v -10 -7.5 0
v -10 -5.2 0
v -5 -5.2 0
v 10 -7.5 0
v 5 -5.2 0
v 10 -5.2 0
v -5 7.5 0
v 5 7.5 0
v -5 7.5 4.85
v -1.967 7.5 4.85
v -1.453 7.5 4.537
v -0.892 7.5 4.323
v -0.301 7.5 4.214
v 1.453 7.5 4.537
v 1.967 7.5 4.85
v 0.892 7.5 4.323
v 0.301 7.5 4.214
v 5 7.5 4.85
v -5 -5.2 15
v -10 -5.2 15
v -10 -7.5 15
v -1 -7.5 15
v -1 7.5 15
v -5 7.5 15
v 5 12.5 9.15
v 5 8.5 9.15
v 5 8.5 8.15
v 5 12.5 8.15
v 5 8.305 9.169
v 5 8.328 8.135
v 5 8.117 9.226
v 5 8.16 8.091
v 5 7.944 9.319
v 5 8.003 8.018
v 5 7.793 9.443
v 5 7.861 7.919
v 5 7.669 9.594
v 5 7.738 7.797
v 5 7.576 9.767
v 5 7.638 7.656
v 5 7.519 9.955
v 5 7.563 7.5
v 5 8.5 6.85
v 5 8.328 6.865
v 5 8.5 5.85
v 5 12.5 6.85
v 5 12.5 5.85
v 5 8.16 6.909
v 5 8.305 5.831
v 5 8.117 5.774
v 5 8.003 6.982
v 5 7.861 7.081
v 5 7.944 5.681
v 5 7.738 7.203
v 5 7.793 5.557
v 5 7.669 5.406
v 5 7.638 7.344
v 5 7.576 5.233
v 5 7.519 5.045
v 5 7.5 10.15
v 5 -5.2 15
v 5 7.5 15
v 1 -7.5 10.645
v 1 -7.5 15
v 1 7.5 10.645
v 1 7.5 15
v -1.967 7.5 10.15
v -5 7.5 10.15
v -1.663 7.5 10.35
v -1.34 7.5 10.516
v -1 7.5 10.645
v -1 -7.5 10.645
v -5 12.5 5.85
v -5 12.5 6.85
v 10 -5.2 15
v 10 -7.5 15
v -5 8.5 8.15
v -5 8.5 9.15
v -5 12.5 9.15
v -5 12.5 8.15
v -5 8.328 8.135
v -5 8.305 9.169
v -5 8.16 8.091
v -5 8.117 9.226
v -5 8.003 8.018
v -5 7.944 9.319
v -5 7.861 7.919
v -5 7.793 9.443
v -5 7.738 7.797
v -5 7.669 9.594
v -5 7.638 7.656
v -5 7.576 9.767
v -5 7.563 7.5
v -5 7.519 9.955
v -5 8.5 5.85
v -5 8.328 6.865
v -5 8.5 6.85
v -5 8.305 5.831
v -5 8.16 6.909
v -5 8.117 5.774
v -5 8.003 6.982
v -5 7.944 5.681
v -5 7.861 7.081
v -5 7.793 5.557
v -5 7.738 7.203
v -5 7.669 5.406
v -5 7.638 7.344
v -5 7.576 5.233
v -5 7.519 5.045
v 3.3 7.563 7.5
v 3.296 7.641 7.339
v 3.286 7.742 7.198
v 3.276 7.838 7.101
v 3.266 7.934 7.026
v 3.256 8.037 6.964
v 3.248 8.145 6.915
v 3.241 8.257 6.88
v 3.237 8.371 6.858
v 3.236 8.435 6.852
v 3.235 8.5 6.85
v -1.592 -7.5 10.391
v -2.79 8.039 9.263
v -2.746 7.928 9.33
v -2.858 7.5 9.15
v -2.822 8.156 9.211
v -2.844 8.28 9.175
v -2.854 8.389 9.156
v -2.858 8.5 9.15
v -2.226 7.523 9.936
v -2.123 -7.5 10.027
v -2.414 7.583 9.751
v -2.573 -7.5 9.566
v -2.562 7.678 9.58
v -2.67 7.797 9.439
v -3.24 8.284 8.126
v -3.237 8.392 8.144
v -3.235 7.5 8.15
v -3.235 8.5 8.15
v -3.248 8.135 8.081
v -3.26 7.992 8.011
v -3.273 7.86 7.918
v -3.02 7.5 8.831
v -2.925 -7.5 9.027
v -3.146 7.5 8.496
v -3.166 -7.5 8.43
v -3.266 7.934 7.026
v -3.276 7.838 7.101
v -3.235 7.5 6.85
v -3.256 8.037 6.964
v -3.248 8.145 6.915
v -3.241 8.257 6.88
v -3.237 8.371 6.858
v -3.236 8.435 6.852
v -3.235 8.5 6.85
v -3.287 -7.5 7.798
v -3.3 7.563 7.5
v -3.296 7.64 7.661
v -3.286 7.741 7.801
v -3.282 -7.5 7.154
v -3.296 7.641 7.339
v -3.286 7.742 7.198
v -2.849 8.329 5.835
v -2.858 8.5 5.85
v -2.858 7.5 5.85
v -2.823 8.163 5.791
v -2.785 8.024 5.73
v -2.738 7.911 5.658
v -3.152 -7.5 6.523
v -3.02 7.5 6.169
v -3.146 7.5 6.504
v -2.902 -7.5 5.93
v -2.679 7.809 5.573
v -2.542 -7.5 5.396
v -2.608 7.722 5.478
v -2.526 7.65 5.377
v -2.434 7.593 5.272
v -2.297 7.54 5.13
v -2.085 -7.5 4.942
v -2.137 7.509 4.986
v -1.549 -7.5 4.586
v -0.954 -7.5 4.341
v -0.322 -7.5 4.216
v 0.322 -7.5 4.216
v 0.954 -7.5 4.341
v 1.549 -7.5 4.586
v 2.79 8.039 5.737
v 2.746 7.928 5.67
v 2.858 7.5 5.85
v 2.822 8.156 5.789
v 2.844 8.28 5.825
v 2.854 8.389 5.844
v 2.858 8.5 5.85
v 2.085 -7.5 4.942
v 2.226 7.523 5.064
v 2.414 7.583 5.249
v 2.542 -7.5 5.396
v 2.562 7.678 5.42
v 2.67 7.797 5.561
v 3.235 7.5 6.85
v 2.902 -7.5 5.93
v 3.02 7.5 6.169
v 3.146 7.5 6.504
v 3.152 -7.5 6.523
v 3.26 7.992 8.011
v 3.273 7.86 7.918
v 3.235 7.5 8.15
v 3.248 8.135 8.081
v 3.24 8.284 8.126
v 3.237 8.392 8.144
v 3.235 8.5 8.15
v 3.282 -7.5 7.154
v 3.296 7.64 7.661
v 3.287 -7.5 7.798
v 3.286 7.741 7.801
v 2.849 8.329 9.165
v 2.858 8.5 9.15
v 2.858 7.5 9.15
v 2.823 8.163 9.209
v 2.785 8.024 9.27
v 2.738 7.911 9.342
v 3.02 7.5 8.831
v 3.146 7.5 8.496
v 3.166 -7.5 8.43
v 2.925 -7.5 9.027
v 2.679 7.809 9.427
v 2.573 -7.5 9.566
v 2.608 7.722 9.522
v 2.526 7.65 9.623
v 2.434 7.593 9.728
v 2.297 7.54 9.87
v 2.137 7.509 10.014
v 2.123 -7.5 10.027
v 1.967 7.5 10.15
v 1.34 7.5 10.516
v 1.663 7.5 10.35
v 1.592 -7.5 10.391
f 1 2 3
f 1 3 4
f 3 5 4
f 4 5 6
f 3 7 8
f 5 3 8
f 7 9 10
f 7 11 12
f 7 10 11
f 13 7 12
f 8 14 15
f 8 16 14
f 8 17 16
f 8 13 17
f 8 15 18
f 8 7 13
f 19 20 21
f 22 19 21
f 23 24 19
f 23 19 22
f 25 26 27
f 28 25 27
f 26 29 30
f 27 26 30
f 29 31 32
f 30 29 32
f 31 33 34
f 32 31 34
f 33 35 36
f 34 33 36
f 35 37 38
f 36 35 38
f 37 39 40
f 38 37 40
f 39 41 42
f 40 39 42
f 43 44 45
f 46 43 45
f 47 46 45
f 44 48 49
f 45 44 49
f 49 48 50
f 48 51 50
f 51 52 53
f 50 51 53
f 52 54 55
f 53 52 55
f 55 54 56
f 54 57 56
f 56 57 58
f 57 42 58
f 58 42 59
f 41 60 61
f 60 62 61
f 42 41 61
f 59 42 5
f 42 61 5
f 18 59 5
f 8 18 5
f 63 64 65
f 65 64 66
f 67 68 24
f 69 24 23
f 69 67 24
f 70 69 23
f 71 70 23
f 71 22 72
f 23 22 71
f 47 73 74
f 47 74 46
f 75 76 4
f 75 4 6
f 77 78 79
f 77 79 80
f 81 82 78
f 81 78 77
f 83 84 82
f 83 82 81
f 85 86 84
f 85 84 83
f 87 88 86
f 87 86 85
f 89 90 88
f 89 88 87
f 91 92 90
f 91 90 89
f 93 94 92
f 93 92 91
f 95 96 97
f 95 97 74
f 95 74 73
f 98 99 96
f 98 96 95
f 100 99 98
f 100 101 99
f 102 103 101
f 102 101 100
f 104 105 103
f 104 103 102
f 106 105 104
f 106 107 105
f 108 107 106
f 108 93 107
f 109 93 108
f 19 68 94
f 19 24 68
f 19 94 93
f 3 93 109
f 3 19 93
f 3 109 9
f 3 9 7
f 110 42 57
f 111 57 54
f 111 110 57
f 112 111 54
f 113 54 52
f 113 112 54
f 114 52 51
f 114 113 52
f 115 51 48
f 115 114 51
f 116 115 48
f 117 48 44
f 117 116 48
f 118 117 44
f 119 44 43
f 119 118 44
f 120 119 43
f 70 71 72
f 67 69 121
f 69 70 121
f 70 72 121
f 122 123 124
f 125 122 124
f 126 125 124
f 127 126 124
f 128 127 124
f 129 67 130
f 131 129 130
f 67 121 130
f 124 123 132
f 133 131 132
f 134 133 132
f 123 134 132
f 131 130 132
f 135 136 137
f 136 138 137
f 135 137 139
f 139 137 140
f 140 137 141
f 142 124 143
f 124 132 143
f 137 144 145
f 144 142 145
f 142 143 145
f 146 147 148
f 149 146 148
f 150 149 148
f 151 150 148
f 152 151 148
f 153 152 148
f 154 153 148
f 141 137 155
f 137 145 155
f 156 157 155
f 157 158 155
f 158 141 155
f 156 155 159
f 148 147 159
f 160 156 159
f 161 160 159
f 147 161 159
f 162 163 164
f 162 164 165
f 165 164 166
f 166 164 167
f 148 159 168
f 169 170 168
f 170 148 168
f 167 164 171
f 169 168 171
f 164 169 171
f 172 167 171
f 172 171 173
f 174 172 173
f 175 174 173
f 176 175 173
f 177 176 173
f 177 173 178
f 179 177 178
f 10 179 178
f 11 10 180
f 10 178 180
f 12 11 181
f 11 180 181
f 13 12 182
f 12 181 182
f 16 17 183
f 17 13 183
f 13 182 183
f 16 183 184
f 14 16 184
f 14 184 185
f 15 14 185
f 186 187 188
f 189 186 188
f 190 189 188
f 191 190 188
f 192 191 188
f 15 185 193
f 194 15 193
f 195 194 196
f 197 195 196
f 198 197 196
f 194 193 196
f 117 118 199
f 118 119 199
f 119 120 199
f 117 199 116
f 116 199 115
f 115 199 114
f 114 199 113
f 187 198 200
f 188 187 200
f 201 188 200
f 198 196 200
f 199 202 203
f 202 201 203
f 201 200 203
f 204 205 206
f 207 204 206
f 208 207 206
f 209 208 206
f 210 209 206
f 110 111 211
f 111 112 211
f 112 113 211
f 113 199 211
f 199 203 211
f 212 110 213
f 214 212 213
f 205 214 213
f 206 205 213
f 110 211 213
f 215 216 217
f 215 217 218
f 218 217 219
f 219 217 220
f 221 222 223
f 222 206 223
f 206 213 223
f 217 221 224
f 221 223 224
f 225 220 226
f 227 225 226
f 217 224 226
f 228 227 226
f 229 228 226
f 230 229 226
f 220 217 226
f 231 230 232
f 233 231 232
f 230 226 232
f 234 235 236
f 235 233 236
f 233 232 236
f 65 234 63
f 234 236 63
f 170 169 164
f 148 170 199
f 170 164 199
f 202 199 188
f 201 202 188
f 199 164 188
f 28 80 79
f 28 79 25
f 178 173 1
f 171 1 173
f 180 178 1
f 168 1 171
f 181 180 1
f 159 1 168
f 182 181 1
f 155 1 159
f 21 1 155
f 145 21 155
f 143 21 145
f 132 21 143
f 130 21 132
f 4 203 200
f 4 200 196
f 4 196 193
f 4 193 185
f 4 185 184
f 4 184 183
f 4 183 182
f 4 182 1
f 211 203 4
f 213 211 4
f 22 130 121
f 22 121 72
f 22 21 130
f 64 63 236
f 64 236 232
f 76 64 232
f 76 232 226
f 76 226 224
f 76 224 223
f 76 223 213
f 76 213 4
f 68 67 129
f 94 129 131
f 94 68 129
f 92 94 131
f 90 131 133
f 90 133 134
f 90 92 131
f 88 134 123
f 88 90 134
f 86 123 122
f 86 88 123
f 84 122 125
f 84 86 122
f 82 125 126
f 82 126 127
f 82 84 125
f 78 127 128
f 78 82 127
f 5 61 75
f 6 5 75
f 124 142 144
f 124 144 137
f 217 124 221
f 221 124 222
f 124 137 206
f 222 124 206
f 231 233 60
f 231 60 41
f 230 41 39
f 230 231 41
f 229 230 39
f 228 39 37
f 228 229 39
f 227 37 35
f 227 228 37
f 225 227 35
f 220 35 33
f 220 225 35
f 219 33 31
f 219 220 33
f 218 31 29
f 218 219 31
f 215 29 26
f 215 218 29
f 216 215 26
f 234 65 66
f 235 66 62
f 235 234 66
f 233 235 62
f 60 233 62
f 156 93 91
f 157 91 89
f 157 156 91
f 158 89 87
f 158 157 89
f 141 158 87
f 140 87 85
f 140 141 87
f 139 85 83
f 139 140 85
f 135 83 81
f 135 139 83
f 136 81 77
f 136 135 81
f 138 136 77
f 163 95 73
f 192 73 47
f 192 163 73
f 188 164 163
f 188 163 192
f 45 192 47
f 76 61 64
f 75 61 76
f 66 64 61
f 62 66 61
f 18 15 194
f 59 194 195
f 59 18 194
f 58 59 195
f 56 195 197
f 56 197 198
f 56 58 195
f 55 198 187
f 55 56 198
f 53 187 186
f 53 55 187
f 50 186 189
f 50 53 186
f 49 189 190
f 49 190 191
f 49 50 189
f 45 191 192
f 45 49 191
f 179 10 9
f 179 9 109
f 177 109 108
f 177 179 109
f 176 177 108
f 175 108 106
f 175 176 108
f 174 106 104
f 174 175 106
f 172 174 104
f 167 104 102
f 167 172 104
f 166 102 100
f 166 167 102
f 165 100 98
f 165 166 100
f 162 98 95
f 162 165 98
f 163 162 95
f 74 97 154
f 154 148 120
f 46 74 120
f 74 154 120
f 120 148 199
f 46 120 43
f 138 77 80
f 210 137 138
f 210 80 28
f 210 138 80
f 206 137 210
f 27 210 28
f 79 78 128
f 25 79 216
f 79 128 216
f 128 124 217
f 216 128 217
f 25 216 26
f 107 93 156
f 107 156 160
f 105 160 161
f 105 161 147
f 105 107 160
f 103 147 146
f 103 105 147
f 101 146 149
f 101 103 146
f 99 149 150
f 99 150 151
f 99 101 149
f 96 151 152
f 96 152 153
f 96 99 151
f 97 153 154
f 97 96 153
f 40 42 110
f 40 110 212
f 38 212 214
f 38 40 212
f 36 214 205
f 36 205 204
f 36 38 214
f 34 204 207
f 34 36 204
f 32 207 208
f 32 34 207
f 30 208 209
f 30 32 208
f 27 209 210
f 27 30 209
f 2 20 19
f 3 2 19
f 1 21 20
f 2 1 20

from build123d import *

# Parameters (mm, degrees)
SKETCH1_W           = 10
SKETCH1_H           = 15
BOSS_EXTRUDE1_DEPTH = 15
SKETCH3_W           = 5
SKETCH3_H           = 2.3
BOSS_EXTRUDE2_DEPTH = 15
SKETCH4_R           = 3.3
CUT_EXTRUDE1_DEPTH  = 24.452078799
SKETCH6_W           = 2
SKETCH6_H           = 15
CUT_EXTRUDE2_DEPTH  = 8
SKETCH7_W           = 10
SKETCH7_H           = 1
BOSS_EXTRUDE3_DEPTH = 5
FILLET1_R           = 1


with BuildPart() as part:
    # Sketch1 → Boss-Extrude1 (new body)
    with BuildSketch(Plane.XY):
        Rectangle(SKETCH1_W, SKETCH1_H)
    extrude(amount=BOSS_EXTRUDE1_DEPTH)

    # Sketch3 → Boss-Extrude2 (add)
    with BuildSketch(Plane.XY.offset(15)):
        with Locations((-7.5, -6.35)):
            Rectangle(SKETCH3_W, SKETCH3_H)
        with Locations((7.5, -6.35)):
            Rectangle(SKETCH3_W, SKETCH3_H)
    extrude(amount=-BOSS_EXTRUDE2_DEPTH)

    # Sketch4 → Cut-Extrude1 (cut, through all)
    with BuildSketch(Plane.XZ.offset(7.5)):
        with Locations(Location((0, 7.5, 0), (0, 0, 270))):
            Circle(SKETCH4_R)
    extrude(amount=-CUT_EXTRUDE1_DEPTH, mode=Mode.SUBTRACT)

    # Sketch6 → Cut-Extrude2 (cut)
    with BuildSketch(Plane.XY.offset(15)):
        Rectangle(SKETCH6_W, SKETCH6_H)
    extrude(amount=-CUT_EXTRUDE2_DEPTH, mode=Mode.SUBTRACT)

    # Sketch7 → Boss-Extrude3 (add)
    with BuildSketch(Plane(origin=(0, 7.5, 0), x_dir=(1, 0, 0), z_dir=(0, 1, 0))):
        with Locations((0, -8.65)):
            Rectangle(SKETCH7_W, SKETCH7_H)
        with Locations((0, -6.35)):
            Rectangle(SKETCH7_W, SKETCH7_H)
    extrude(amount=BOSS_EXTRUDE3_DEPTH)

    # Fillet1
    # the kernel refuses this fillet: 1 mm, written as the material it adds along each edge
    with BuildSketch(Plane(origin=(5, 7.5, 5.85), x_dir=(0, 0, -1), z_dir=(-1, 0, 0))) as fillet1_piece_1_section:
        with BuildLine():
            CenterArc((FILLET1_R, -FILLET1_R), FILLET1_R, 90, 90)
            Line((0, -FILLET1_R), (0, 0))
            Line((0, 0), (FILLET1_R, 0))
        make_face()
    fillet1_piece_1 = extrude(amount=4.642116168, mode=Mode.PRIVATE)
    fillet1_piece_1 = fillet1_piece_1 - Plane(origin=(0, 7.716795794, 7.5), x_dir=(0, 0, -1), z_dir=(0, -1, 0)) * Cylinder(3.3, 14, mode=Mode.PRIVATE)
    add(fillet1_piece_1)
    with BuildSketch(Plane(origin=(0.735351604, 7.5, 6.85), x_dir=(0, 0, 1), z_dir=(1, 0, 0))) as fillet1_piece_2_section:
        with BuildLine():
            CenterArc((FILLET1_R, -FILLET1_R), FILLET1_R, 90, 90)
            Line((0, -FILLET1_R), (0, 0))
            Line((0, 0), (FILLET1_R, 0))
        make_face()
    fillet1_piece_2 = extrude(amount=4.264648396, mode=Mode.PRIVATE)
    fillet1_piece_2 = fillet1_piece_2 - Plane(origin=(0, 7.724716743, 7.5), x_dir=(0, 0, -1), z_dir=(0, -1, 0)) * Cylinder(3.3, 13, mode=Mode.PRIVATE)
    add(fillet1_piece_2)
    with BuildSketch(Plane(origin=(-0.357883832, 7.5, 5.85), x_dir=(0, 0, -1), z_dir=(-1, 0, 0))) as fillet1_piece_3_section:
        with BuildLine():
            CenterArc((FILLET1_R, -FILLET1_R), FILLET1_R, 90, 90)
            Line((0, -FILLET1_R), (0, 0))
            Line((0, 0), (FILLET1_R, 0))
        make_face()
    fillet1_piece_3 = extrude(amount=4.642116168, mode=Mode.PRIVATE)
    fillet1_piece_3 = fillet1_piece_3 - Plane(origin=(0, 7.716795859, 7.5), x_dir=(0, 0, -1), z_dir=(0, -1, 0)) * Cylinder(3.3, 14, mode=Mode.PRIVATE)
    add(fillet1_piece_3)
    with BuildSketch(Plane(origin=(-5, 7.5, 6.85), x_dir=(0, 0, 1), z_dir=(1, 0, 0))) as fillet1_piece_4_section:
        with BuildLine():
            CenterArc((FILLET1_R, -FILLET1_R), FILLET1_R, 90, 90)
            Line((0, -FILLET1_R), (0, 0))
            Line((0, 0), (FILLET1_R, 0))
        make_face()
    fillet1_piece_4 = extrude(amount=4.264648396, mode=Mode.PRIVATE)
    fillet1_piece_4 = fillet1_piece_4 - Plane(origin=(0, 7.724717828, 7.5), x_dir=(0, 0, -1), z_dir=(0, -1, 0)) * Cylinder(3.3, 13, mode=Mode.PRIVATE)
    add(fillet1_piece_4)
    with BuildSketch(Plane(origin=(-0.735351604, 7.5, 8.15), x_dir=(0, 0, -1), z_dir=(-1, 0, 0))) as fillet1_piece_5_section:
        with BuildLine():
            CenterArc((FILLET1_R, -FILLET1_R), FILLET1_R, 90, 90)
            Line((0, -FILLET1_R), (0, 0))
            Line((0, 0), (FILLET1_R, 0))
        make_face()
    fillet1_piece_5 = extrude(amount=4.264648396, mode=Mode.PRIVATE)
    fillet1_piece_5 = fillet1_piece_5 - Plane(origin=(0, 7.724716743, 7.5), x_dir=(0, 0, -1), z_dir=(0, -1, 0)) * Cylinder(3.3, 13, mode=Mode.PRIVATE)
    add(fillet1_piece_5)
    with BuildSketch(Plane(origin=(5, 7.5, 8.15), x_dir=(0, 0, -1), z_dir=(-1, 0, 0))) as fillet1_piece_6_section:
        with BuildLine():
            CenterArc((FILLET1_R, -FILLET1_R), FILLET1_R, 90, 90)
            Line((0, -FILLET1_R), (0, 0))
            Line((0, 0), (FILLET1_R, 0))
        make_face()
    fillet1_piece_6 = extrude(amount=4.264648396, mode=Mode.PRIVATE)
    fillet1_piece_6 = fillet1_piece_6 - Plane(origin=(0, 7.724717828, 7.5), x_dir=(0, 0, -1), z_dir=(0, -1, 0)) * Cylinder(3.3, 13, mode=Mode.PRIVATE)
    add(fillet1_piece_6)
    with BuildSketch(Plane(origin=(-5, 7.5, 9.15), x_dir=(0, 0, 1), z_dir=(1, 0, 0))) as fillet1_piece_7_section:
        with BuildLine():
            CenterArc((FILLET1_R, -FILLET1_R), FILLET1_R, 90, 90)
            Line((0, -FILLET1_R), (0, 0))
            Line((0, 0), (FILLET1_R, 0))
        make_face()
    fillet1_piece_7 = extrude(amount=4.642116168, mode=Mode.PRIVATE)
    fillet1_piece_7 = fillet1_piece_7 - Plane(origin=(0, 7.716795794, 7.5), x_dir=(0, 0, -1), z_dir=(0, -1, 0)) * Cylinder(3.3, 14, mode=Mode.PRIVATE)
    add(fillet1_piece_7)
    with BuildSketch(Plane(origin=(0.357883832, 7.5, 9.15), x_dir=(0, 0, 1), z_dir=(1, 0, 0))) as fillet1_piece_8_section:
        with BuildLine():
            CenterArc((FILLET1_R, -FILLET1_R), FILLET1_R, 90, 90)
            Line((0, -FILLET1_R), (0, 0))
            Line((0, 0), (FILLET1_R, 0))
        make_face()
    fillet1_piece_8 = extrude(amount=4.642116168, mode=Mode.PRIVATE)
    fillet1_piece_8 = fillet1_piece_8 - Plane(origin=(0, 7.716795859, 7.5), x_dir=(0, 0, -1), z_dir=(0, -1, 0)) * Cylinder(3.3, 14, mode=Mode.PRIVATE)
    add(fillet1_piece_8)


solid = part.part
